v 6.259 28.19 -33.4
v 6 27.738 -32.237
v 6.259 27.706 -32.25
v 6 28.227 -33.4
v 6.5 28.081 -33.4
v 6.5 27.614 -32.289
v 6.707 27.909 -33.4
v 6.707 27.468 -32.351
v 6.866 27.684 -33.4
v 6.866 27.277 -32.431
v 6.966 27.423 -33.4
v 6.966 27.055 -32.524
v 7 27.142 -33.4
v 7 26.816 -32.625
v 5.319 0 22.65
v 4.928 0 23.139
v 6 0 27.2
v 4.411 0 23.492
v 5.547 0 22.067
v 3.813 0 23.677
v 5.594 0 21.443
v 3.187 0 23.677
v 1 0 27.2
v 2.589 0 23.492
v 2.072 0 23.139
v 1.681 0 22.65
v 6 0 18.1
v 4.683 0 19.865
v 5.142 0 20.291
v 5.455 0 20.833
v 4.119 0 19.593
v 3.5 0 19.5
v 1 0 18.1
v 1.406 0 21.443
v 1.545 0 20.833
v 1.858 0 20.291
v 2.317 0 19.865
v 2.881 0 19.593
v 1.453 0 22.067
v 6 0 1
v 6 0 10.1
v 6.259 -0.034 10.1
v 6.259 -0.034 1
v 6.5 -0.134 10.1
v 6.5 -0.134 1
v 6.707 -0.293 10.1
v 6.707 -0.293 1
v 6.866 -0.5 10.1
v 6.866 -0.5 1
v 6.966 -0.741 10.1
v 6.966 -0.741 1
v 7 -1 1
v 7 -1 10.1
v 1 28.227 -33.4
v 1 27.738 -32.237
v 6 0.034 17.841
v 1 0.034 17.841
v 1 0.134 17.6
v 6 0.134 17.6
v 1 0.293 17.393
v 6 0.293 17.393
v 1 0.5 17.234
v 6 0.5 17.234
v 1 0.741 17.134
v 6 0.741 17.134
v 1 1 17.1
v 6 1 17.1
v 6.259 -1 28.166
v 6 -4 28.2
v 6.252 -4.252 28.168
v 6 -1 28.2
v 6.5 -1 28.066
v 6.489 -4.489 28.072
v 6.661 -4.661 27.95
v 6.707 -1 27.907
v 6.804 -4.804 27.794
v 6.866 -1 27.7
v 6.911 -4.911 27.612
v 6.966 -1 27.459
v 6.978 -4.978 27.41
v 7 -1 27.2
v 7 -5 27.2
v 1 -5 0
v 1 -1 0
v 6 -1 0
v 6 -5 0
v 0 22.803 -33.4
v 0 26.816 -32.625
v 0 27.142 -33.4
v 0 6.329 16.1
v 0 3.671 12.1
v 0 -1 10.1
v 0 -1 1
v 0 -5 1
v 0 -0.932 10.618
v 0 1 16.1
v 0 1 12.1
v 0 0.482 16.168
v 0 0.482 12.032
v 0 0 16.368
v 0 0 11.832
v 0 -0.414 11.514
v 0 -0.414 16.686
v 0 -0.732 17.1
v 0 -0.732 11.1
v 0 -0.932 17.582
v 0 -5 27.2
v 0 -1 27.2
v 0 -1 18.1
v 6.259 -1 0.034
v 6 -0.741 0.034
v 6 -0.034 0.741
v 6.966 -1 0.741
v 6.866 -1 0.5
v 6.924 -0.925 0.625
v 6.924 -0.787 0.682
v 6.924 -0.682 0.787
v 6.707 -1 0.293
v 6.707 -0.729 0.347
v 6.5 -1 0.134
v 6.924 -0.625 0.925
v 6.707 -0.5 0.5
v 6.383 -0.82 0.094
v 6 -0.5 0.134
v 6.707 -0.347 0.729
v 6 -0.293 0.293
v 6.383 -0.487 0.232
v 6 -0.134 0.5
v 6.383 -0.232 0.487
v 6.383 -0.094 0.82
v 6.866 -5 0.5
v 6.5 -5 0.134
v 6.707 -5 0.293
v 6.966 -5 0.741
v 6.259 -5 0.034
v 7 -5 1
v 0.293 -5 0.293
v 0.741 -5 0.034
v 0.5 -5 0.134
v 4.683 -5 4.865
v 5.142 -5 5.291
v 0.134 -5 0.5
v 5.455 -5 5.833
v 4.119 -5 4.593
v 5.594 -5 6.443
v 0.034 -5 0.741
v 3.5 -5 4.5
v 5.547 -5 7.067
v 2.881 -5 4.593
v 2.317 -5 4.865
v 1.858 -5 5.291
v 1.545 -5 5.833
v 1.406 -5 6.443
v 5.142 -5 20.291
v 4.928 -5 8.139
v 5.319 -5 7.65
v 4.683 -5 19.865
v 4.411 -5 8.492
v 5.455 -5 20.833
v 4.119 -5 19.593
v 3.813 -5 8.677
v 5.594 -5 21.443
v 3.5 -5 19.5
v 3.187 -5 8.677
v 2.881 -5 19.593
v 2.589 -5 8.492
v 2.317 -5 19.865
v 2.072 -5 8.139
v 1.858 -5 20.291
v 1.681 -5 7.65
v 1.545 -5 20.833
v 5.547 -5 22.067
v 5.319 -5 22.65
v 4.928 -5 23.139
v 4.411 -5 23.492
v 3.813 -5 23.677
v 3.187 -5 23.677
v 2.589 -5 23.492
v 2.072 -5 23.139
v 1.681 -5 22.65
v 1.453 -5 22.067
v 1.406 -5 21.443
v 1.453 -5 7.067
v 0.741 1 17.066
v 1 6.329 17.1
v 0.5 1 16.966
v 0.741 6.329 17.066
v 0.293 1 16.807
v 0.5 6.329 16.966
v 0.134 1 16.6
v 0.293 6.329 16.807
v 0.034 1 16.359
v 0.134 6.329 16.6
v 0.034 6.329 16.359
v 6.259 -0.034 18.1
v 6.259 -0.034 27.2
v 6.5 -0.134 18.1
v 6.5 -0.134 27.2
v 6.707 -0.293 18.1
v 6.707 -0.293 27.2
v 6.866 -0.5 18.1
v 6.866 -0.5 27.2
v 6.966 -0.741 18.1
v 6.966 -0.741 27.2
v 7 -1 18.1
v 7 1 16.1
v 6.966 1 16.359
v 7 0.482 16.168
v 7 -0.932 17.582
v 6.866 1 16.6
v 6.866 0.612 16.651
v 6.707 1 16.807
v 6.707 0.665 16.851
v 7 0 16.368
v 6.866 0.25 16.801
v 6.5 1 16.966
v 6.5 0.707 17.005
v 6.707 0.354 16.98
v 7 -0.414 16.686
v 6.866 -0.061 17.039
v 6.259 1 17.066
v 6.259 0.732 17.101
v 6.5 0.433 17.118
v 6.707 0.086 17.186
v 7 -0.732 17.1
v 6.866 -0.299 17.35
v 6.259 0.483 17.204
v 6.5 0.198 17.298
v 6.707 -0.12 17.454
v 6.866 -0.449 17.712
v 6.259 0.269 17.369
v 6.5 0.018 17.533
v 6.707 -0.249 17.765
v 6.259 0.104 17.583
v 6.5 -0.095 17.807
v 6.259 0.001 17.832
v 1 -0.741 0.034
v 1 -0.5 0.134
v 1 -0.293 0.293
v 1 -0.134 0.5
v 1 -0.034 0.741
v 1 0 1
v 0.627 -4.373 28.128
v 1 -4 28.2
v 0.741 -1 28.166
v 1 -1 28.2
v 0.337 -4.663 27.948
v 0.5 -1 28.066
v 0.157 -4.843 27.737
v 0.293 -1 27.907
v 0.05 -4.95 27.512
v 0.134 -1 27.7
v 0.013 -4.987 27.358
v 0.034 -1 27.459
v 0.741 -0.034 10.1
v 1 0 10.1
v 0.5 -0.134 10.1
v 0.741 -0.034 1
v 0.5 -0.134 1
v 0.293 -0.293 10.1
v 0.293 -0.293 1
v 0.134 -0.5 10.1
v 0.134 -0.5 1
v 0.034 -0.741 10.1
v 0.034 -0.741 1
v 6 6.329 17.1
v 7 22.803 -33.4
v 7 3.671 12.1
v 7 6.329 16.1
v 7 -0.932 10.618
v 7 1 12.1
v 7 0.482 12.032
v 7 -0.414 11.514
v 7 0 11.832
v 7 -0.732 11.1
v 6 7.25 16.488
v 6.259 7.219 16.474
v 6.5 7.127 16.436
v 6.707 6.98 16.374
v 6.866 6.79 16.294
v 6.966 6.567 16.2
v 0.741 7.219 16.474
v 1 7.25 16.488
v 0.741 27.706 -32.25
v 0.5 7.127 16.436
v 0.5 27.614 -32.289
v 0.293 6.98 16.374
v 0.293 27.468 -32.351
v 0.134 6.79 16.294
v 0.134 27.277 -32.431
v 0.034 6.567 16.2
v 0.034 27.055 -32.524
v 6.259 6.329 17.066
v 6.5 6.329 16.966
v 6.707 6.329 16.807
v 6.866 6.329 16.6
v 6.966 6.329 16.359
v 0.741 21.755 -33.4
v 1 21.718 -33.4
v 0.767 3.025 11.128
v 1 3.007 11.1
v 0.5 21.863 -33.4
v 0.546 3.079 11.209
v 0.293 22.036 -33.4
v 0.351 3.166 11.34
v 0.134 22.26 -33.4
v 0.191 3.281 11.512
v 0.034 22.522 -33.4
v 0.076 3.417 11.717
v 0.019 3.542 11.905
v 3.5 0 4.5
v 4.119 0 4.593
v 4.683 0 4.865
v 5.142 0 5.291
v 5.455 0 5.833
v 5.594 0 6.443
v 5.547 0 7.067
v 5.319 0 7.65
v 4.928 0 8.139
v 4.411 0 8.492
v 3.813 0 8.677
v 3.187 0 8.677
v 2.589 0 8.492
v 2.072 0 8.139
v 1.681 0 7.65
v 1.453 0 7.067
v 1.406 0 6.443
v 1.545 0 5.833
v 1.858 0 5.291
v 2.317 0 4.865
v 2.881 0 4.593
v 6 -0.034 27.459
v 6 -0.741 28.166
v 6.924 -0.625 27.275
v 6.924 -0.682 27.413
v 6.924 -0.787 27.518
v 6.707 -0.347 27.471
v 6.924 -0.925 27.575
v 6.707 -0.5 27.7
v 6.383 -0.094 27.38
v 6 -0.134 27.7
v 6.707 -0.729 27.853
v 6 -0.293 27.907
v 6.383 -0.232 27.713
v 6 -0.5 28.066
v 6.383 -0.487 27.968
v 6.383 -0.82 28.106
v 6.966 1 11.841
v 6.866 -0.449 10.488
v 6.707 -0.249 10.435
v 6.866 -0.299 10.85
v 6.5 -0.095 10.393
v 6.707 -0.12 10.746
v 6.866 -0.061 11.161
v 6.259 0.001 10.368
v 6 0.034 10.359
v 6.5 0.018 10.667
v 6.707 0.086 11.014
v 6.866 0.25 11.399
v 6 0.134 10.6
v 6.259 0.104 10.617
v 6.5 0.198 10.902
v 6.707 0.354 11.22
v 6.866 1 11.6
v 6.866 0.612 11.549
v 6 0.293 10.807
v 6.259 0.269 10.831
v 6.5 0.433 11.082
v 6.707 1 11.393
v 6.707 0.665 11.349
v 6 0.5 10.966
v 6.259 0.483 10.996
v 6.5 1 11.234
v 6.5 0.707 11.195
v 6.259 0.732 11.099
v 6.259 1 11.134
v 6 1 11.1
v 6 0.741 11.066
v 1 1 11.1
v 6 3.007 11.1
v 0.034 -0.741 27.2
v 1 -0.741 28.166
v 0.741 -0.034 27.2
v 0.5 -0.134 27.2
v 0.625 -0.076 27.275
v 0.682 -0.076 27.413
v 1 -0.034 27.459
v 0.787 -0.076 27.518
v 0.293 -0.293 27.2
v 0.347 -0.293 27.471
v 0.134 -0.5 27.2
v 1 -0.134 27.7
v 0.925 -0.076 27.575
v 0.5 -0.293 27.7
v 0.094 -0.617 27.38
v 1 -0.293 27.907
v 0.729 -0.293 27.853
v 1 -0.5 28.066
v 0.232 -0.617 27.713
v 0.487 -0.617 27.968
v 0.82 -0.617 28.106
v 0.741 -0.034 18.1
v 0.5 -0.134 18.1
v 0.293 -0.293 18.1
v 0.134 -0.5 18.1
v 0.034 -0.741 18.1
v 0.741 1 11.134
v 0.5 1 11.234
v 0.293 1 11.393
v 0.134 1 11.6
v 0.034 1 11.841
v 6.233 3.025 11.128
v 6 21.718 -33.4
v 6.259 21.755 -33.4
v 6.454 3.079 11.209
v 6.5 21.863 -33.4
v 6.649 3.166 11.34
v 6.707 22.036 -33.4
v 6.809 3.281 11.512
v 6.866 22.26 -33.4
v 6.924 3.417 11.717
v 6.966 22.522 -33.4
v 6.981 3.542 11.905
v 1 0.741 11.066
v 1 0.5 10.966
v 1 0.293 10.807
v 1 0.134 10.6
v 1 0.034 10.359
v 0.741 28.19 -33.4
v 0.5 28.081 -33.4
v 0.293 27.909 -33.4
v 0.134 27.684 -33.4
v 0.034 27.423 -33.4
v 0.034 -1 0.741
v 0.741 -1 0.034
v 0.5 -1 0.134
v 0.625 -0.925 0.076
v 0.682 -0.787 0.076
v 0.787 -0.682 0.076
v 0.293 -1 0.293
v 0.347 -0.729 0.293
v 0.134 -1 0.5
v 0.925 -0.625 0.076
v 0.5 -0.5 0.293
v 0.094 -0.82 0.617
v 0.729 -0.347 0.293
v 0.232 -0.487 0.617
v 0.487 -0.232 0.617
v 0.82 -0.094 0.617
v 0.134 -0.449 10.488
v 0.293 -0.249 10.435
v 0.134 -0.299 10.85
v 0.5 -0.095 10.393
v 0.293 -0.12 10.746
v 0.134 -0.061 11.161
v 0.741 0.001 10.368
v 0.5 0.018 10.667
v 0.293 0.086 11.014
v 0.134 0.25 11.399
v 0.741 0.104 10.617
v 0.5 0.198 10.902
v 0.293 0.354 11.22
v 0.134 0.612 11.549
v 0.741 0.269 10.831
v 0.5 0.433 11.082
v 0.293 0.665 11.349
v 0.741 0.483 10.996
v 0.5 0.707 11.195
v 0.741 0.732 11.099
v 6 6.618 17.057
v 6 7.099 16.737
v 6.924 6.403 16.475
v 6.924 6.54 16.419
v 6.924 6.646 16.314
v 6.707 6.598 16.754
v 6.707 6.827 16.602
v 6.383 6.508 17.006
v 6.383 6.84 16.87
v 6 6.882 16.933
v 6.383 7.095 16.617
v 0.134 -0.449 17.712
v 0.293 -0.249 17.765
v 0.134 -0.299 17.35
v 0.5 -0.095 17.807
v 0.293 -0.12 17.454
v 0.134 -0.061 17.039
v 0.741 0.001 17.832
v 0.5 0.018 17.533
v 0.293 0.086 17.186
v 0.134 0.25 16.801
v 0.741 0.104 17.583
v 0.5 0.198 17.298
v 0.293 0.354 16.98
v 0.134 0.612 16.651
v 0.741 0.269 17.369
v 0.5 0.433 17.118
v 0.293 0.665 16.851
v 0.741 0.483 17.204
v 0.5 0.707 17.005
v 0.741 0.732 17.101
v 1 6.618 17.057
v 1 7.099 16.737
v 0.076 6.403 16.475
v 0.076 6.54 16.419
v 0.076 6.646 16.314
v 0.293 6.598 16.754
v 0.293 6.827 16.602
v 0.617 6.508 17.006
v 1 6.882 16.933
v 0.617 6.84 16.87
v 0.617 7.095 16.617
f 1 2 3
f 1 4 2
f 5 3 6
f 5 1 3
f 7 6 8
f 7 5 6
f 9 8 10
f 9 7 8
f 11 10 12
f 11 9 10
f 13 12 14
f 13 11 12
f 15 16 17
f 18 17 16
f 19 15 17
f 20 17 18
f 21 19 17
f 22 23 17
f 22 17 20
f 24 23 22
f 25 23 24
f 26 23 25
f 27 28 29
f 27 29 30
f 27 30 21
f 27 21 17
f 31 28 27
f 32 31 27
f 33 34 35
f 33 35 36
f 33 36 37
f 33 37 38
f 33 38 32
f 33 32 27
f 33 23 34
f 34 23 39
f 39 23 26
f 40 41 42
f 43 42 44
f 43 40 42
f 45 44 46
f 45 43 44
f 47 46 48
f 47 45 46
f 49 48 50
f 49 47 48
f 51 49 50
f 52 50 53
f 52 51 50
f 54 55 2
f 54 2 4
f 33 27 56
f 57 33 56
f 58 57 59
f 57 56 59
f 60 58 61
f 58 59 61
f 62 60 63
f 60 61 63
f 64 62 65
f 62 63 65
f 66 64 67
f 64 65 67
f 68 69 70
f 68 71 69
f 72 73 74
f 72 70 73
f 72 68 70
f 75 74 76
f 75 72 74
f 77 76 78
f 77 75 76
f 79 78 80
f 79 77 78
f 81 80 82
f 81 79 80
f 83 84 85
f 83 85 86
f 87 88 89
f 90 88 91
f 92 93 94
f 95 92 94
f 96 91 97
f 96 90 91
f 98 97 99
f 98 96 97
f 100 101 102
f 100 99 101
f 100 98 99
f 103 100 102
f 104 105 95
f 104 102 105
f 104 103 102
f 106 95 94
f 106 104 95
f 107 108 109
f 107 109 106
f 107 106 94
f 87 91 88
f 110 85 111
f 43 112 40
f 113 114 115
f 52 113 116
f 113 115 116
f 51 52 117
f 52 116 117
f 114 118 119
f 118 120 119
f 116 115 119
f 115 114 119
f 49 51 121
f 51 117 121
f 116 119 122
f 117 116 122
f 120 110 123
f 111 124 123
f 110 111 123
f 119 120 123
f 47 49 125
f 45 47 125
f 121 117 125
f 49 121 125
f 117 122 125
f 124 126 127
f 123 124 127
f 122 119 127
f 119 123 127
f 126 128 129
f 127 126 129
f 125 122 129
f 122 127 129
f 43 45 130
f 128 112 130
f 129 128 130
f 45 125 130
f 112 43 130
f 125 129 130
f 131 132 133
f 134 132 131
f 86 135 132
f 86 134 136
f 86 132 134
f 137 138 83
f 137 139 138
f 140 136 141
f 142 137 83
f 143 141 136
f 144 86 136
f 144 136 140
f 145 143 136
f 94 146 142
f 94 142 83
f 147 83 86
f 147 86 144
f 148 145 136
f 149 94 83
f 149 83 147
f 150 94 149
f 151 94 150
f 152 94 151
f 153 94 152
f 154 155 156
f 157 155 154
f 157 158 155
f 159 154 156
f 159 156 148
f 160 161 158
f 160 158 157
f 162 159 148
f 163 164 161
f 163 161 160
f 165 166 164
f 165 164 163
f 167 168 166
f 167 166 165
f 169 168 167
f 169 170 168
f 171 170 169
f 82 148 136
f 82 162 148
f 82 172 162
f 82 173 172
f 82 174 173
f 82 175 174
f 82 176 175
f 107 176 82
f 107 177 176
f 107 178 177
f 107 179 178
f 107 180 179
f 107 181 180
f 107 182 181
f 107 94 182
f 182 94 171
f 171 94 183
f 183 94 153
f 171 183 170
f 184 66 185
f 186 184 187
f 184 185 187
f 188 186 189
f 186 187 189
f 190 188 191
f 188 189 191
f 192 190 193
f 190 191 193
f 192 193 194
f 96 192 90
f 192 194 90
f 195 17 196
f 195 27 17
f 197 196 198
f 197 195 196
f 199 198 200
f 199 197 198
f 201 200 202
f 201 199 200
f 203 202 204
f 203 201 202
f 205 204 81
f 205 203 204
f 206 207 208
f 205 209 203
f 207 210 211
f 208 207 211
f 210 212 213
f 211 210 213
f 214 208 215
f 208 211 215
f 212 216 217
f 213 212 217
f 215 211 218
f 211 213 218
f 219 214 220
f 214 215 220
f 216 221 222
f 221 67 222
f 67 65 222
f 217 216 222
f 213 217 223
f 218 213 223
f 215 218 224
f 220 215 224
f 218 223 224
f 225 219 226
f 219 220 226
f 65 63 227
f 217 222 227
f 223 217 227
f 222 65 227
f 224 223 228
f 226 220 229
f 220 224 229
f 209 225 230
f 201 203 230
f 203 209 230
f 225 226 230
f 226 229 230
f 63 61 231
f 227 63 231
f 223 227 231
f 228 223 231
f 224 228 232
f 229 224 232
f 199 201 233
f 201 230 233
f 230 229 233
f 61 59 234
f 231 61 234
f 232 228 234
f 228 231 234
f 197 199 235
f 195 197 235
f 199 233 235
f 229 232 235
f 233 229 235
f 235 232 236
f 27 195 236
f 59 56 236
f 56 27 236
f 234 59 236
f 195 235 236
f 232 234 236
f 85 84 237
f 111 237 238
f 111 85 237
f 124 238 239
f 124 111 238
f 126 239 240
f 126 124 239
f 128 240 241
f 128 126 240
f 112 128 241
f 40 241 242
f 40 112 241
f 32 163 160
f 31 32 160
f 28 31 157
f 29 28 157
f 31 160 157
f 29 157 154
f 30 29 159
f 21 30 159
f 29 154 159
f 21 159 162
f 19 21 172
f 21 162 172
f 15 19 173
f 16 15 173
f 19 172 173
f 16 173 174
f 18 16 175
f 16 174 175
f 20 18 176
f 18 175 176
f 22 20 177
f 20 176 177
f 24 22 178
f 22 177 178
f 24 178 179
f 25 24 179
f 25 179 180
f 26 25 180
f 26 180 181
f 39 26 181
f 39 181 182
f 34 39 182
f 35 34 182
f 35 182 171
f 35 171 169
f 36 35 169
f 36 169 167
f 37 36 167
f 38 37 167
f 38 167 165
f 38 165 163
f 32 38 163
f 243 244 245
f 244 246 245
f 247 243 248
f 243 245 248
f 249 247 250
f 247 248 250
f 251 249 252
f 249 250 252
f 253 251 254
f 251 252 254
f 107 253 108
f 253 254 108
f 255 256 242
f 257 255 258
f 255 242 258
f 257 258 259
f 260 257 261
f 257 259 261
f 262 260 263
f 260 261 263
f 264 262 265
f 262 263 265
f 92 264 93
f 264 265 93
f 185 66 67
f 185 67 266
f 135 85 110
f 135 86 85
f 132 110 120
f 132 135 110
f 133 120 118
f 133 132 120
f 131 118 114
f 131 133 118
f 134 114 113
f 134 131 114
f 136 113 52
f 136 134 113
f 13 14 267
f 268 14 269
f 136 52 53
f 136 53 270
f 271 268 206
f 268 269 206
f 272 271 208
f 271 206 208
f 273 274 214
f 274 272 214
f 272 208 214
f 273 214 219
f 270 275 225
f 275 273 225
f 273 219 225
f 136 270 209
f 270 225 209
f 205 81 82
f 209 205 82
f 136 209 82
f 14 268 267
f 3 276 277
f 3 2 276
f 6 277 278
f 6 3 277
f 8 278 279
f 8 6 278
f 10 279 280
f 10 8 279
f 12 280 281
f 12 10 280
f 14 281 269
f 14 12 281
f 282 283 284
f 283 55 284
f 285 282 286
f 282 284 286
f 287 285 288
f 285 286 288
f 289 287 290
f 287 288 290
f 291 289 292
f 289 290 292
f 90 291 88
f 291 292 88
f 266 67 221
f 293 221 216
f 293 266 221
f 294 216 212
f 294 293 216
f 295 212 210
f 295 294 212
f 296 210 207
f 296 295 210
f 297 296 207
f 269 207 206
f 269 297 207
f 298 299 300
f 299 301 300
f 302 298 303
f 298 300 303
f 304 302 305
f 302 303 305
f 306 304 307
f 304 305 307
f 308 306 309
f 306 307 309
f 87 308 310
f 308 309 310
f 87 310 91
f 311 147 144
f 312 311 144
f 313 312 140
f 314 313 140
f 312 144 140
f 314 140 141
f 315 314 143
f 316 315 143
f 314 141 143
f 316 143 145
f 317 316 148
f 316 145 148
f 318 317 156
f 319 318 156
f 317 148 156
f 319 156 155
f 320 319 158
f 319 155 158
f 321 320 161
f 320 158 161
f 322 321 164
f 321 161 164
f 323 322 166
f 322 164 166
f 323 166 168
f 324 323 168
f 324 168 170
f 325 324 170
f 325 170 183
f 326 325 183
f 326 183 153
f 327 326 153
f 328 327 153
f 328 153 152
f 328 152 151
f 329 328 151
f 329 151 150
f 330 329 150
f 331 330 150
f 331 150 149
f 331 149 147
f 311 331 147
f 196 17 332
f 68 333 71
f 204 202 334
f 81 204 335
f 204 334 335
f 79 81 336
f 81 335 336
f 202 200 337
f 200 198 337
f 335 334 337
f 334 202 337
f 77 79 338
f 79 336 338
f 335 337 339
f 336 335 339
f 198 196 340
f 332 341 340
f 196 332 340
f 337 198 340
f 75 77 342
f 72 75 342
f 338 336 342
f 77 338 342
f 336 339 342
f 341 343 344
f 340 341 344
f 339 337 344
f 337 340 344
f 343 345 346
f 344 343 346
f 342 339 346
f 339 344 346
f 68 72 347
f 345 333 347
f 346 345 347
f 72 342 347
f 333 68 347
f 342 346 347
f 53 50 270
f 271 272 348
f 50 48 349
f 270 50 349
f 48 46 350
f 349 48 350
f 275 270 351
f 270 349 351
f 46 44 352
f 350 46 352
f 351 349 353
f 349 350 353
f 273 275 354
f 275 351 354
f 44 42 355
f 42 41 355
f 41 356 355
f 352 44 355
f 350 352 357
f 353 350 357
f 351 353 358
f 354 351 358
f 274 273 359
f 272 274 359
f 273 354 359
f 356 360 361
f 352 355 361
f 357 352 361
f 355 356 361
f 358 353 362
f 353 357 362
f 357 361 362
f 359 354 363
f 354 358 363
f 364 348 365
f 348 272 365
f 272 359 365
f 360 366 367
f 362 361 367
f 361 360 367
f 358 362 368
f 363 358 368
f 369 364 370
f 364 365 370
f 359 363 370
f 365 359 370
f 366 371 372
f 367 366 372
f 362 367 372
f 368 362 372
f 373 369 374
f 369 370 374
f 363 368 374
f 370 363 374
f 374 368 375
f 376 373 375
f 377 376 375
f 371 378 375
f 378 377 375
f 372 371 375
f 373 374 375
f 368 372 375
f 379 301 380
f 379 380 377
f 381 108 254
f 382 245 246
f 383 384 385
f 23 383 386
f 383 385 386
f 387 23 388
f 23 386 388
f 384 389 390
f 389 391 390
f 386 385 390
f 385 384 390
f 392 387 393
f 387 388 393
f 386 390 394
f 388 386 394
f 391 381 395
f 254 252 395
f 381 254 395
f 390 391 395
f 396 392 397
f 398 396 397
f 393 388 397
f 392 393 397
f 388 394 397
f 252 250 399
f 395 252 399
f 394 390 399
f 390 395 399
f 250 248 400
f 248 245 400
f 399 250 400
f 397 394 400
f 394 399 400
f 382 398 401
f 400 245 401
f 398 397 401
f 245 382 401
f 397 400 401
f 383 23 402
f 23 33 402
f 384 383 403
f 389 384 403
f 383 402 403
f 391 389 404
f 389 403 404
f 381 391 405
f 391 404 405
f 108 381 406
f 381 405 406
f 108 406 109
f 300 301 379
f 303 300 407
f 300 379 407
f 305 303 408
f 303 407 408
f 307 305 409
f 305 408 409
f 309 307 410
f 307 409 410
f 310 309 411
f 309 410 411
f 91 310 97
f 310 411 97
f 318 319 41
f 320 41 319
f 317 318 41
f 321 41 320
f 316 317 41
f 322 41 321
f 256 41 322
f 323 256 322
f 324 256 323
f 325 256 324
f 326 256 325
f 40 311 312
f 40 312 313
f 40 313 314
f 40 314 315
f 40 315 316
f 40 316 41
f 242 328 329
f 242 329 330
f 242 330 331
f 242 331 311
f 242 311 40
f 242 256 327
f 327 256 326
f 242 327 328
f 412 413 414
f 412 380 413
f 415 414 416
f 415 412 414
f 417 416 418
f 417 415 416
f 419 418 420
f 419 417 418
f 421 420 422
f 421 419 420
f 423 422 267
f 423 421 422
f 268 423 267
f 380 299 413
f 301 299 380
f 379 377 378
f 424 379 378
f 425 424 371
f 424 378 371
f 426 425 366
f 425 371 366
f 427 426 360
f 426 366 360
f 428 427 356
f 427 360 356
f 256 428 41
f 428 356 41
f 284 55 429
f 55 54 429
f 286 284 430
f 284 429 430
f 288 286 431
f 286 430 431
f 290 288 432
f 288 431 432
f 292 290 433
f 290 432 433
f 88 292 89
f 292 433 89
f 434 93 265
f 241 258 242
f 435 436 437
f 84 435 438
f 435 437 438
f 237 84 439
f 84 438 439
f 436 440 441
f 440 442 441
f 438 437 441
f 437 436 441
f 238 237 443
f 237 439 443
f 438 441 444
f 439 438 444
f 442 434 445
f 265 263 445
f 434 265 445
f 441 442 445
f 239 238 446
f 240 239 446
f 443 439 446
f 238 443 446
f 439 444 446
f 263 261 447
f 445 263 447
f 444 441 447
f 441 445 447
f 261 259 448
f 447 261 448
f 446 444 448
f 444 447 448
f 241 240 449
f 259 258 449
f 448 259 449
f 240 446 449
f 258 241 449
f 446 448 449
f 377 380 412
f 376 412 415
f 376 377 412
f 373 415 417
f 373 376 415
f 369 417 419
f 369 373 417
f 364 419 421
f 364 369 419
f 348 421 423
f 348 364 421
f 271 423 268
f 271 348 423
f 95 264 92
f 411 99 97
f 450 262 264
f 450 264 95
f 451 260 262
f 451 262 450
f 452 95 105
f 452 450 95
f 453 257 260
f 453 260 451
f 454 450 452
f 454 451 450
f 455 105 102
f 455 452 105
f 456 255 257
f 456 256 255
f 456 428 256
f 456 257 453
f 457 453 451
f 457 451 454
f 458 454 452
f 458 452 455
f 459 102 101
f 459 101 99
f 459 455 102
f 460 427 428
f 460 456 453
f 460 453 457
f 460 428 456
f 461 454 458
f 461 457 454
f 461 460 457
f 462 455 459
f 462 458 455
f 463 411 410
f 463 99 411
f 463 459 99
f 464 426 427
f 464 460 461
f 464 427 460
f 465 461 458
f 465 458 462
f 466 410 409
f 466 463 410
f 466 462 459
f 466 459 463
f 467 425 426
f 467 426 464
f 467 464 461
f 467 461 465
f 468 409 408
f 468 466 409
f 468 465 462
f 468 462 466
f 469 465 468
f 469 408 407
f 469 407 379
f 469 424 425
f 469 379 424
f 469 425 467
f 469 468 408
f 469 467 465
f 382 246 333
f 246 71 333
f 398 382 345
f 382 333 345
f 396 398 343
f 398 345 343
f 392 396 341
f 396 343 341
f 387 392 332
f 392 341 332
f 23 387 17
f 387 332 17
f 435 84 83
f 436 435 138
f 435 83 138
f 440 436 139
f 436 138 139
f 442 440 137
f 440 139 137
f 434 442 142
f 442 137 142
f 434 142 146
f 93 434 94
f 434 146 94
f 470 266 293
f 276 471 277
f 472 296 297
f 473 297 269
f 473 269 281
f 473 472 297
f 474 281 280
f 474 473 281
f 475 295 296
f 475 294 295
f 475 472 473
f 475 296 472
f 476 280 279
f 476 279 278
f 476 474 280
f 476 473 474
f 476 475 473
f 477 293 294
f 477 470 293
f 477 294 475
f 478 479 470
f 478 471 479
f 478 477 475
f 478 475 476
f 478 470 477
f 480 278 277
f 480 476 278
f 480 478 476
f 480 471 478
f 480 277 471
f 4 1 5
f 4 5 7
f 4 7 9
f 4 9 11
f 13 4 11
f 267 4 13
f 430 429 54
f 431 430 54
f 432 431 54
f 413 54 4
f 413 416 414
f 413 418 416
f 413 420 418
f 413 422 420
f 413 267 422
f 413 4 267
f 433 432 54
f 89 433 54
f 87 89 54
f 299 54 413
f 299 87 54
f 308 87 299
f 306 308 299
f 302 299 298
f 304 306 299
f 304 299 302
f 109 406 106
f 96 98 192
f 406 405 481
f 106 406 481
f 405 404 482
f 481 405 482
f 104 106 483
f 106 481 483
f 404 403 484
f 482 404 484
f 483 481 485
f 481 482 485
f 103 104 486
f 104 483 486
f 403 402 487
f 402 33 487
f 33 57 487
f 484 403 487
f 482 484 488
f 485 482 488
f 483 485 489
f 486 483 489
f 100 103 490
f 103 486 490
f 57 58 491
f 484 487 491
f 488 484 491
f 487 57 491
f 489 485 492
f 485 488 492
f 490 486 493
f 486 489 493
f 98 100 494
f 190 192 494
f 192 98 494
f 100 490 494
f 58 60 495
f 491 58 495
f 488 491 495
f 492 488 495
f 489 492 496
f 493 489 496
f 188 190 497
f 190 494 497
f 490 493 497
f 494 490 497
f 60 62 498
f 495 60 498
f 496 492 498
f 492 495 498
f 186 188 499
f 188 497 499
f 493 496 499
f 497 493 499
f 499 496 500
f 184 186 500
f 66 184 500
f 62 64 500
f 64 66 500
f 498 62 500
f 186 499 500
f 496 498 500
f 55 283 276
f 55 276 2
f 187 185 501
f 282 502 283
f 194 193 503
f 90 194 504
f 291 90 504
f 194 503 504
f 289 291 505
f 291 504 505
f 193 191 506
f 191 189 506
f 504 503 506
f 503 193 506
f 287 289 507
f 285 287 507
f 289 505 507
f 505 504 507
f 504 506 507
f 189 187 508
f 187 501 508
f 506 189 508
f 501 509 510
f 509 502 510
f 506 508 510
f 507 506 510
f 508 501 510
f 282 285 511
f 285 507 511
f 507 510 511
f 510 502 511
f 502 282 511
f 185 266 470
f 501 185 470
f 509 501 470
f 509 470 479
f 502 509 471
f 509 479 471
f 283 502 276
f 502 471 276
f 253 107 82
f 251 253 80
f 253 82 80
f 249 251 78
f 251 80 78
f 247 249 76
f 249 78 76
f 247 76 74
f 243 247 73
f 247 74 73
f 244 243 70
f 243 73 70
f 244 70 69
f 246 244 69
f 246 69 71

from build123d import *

# Parameters (mm, degrees)
BOSS_EXTRUDE1_DEPTH = 7
FILLET1_R           = 1
SKETCH2_R           = 2.1
CUT_EXTRUDE1_DEPTH  = 7


with BuildPart() as part:
    # Sketch1 → Boss-Extrude1 (new body)
    with BuildSketch(Plane.YZ):
        Polygon((0, 0), (-5, 0), (-5, 28.2), (0, 28.2), (0, 17.1), (6.992997501, 17.1), (27.73775651, -32.237200317), (28.226677629, -33.4), (21.717869147, -33.4), (3.007002499, 11.1), (0, 11.1), align=None)
    extrude(amount=BOSS_EXTRUDE1_DEPTH)

    # Fillet1
    fillet1_edges = [part.edges().sort_by_distance(p)[0] for p in [
        (0, 0, 5.55),
        (0, -2.5, 0),
        (0, -2.5, 28.2),
        (0, 0, 22.65),
        (0, 3.49649875, 17.1),
        (0, 17.609837565, -8.15),
        (0, 12.362435823, -11.15),
        (0, 1.50350125, 11.1),
        (7, 17.609837565, -8.15),
        (3.5, 0, 11.1),
        (3.5, 0, 0),
        (3.5, -5, 28.2),
        (3.5, 0, 28.2),
        (3.5, 0, 17.1),
        (3.5, 6.992997501, 17.1),
        (7, 3.49649875, 17.1),
        (7, 0, 22.65),
        (7, -2.5, 28.2),
        (7, -2.5, 0),
        (7, 0, 5.55),
        (7, 1.50350125, 11.1),
        (7, 12.362435823, -11.15),
    ]]
    fillet(fillet1_edges, radius=FILLET1_R)

    # Sketch2 → Cut-Extrude1 (cut)
    with BuildSketch(Plane.XZ.offset(5)):
        with Locations(Location((3.5, 21.6, 0), (0, 0, 270))):
            Circle(SKETCH2_R)
        with Locations(Location((3.5, 6.6, 0), (0, 0, 270))):
            Circle(SKETCH2_R)
    extrude(amount=-CUT_EXTRUDE1_DEPTH, mode=Mode.SUBTRACT)


solid = part.part
